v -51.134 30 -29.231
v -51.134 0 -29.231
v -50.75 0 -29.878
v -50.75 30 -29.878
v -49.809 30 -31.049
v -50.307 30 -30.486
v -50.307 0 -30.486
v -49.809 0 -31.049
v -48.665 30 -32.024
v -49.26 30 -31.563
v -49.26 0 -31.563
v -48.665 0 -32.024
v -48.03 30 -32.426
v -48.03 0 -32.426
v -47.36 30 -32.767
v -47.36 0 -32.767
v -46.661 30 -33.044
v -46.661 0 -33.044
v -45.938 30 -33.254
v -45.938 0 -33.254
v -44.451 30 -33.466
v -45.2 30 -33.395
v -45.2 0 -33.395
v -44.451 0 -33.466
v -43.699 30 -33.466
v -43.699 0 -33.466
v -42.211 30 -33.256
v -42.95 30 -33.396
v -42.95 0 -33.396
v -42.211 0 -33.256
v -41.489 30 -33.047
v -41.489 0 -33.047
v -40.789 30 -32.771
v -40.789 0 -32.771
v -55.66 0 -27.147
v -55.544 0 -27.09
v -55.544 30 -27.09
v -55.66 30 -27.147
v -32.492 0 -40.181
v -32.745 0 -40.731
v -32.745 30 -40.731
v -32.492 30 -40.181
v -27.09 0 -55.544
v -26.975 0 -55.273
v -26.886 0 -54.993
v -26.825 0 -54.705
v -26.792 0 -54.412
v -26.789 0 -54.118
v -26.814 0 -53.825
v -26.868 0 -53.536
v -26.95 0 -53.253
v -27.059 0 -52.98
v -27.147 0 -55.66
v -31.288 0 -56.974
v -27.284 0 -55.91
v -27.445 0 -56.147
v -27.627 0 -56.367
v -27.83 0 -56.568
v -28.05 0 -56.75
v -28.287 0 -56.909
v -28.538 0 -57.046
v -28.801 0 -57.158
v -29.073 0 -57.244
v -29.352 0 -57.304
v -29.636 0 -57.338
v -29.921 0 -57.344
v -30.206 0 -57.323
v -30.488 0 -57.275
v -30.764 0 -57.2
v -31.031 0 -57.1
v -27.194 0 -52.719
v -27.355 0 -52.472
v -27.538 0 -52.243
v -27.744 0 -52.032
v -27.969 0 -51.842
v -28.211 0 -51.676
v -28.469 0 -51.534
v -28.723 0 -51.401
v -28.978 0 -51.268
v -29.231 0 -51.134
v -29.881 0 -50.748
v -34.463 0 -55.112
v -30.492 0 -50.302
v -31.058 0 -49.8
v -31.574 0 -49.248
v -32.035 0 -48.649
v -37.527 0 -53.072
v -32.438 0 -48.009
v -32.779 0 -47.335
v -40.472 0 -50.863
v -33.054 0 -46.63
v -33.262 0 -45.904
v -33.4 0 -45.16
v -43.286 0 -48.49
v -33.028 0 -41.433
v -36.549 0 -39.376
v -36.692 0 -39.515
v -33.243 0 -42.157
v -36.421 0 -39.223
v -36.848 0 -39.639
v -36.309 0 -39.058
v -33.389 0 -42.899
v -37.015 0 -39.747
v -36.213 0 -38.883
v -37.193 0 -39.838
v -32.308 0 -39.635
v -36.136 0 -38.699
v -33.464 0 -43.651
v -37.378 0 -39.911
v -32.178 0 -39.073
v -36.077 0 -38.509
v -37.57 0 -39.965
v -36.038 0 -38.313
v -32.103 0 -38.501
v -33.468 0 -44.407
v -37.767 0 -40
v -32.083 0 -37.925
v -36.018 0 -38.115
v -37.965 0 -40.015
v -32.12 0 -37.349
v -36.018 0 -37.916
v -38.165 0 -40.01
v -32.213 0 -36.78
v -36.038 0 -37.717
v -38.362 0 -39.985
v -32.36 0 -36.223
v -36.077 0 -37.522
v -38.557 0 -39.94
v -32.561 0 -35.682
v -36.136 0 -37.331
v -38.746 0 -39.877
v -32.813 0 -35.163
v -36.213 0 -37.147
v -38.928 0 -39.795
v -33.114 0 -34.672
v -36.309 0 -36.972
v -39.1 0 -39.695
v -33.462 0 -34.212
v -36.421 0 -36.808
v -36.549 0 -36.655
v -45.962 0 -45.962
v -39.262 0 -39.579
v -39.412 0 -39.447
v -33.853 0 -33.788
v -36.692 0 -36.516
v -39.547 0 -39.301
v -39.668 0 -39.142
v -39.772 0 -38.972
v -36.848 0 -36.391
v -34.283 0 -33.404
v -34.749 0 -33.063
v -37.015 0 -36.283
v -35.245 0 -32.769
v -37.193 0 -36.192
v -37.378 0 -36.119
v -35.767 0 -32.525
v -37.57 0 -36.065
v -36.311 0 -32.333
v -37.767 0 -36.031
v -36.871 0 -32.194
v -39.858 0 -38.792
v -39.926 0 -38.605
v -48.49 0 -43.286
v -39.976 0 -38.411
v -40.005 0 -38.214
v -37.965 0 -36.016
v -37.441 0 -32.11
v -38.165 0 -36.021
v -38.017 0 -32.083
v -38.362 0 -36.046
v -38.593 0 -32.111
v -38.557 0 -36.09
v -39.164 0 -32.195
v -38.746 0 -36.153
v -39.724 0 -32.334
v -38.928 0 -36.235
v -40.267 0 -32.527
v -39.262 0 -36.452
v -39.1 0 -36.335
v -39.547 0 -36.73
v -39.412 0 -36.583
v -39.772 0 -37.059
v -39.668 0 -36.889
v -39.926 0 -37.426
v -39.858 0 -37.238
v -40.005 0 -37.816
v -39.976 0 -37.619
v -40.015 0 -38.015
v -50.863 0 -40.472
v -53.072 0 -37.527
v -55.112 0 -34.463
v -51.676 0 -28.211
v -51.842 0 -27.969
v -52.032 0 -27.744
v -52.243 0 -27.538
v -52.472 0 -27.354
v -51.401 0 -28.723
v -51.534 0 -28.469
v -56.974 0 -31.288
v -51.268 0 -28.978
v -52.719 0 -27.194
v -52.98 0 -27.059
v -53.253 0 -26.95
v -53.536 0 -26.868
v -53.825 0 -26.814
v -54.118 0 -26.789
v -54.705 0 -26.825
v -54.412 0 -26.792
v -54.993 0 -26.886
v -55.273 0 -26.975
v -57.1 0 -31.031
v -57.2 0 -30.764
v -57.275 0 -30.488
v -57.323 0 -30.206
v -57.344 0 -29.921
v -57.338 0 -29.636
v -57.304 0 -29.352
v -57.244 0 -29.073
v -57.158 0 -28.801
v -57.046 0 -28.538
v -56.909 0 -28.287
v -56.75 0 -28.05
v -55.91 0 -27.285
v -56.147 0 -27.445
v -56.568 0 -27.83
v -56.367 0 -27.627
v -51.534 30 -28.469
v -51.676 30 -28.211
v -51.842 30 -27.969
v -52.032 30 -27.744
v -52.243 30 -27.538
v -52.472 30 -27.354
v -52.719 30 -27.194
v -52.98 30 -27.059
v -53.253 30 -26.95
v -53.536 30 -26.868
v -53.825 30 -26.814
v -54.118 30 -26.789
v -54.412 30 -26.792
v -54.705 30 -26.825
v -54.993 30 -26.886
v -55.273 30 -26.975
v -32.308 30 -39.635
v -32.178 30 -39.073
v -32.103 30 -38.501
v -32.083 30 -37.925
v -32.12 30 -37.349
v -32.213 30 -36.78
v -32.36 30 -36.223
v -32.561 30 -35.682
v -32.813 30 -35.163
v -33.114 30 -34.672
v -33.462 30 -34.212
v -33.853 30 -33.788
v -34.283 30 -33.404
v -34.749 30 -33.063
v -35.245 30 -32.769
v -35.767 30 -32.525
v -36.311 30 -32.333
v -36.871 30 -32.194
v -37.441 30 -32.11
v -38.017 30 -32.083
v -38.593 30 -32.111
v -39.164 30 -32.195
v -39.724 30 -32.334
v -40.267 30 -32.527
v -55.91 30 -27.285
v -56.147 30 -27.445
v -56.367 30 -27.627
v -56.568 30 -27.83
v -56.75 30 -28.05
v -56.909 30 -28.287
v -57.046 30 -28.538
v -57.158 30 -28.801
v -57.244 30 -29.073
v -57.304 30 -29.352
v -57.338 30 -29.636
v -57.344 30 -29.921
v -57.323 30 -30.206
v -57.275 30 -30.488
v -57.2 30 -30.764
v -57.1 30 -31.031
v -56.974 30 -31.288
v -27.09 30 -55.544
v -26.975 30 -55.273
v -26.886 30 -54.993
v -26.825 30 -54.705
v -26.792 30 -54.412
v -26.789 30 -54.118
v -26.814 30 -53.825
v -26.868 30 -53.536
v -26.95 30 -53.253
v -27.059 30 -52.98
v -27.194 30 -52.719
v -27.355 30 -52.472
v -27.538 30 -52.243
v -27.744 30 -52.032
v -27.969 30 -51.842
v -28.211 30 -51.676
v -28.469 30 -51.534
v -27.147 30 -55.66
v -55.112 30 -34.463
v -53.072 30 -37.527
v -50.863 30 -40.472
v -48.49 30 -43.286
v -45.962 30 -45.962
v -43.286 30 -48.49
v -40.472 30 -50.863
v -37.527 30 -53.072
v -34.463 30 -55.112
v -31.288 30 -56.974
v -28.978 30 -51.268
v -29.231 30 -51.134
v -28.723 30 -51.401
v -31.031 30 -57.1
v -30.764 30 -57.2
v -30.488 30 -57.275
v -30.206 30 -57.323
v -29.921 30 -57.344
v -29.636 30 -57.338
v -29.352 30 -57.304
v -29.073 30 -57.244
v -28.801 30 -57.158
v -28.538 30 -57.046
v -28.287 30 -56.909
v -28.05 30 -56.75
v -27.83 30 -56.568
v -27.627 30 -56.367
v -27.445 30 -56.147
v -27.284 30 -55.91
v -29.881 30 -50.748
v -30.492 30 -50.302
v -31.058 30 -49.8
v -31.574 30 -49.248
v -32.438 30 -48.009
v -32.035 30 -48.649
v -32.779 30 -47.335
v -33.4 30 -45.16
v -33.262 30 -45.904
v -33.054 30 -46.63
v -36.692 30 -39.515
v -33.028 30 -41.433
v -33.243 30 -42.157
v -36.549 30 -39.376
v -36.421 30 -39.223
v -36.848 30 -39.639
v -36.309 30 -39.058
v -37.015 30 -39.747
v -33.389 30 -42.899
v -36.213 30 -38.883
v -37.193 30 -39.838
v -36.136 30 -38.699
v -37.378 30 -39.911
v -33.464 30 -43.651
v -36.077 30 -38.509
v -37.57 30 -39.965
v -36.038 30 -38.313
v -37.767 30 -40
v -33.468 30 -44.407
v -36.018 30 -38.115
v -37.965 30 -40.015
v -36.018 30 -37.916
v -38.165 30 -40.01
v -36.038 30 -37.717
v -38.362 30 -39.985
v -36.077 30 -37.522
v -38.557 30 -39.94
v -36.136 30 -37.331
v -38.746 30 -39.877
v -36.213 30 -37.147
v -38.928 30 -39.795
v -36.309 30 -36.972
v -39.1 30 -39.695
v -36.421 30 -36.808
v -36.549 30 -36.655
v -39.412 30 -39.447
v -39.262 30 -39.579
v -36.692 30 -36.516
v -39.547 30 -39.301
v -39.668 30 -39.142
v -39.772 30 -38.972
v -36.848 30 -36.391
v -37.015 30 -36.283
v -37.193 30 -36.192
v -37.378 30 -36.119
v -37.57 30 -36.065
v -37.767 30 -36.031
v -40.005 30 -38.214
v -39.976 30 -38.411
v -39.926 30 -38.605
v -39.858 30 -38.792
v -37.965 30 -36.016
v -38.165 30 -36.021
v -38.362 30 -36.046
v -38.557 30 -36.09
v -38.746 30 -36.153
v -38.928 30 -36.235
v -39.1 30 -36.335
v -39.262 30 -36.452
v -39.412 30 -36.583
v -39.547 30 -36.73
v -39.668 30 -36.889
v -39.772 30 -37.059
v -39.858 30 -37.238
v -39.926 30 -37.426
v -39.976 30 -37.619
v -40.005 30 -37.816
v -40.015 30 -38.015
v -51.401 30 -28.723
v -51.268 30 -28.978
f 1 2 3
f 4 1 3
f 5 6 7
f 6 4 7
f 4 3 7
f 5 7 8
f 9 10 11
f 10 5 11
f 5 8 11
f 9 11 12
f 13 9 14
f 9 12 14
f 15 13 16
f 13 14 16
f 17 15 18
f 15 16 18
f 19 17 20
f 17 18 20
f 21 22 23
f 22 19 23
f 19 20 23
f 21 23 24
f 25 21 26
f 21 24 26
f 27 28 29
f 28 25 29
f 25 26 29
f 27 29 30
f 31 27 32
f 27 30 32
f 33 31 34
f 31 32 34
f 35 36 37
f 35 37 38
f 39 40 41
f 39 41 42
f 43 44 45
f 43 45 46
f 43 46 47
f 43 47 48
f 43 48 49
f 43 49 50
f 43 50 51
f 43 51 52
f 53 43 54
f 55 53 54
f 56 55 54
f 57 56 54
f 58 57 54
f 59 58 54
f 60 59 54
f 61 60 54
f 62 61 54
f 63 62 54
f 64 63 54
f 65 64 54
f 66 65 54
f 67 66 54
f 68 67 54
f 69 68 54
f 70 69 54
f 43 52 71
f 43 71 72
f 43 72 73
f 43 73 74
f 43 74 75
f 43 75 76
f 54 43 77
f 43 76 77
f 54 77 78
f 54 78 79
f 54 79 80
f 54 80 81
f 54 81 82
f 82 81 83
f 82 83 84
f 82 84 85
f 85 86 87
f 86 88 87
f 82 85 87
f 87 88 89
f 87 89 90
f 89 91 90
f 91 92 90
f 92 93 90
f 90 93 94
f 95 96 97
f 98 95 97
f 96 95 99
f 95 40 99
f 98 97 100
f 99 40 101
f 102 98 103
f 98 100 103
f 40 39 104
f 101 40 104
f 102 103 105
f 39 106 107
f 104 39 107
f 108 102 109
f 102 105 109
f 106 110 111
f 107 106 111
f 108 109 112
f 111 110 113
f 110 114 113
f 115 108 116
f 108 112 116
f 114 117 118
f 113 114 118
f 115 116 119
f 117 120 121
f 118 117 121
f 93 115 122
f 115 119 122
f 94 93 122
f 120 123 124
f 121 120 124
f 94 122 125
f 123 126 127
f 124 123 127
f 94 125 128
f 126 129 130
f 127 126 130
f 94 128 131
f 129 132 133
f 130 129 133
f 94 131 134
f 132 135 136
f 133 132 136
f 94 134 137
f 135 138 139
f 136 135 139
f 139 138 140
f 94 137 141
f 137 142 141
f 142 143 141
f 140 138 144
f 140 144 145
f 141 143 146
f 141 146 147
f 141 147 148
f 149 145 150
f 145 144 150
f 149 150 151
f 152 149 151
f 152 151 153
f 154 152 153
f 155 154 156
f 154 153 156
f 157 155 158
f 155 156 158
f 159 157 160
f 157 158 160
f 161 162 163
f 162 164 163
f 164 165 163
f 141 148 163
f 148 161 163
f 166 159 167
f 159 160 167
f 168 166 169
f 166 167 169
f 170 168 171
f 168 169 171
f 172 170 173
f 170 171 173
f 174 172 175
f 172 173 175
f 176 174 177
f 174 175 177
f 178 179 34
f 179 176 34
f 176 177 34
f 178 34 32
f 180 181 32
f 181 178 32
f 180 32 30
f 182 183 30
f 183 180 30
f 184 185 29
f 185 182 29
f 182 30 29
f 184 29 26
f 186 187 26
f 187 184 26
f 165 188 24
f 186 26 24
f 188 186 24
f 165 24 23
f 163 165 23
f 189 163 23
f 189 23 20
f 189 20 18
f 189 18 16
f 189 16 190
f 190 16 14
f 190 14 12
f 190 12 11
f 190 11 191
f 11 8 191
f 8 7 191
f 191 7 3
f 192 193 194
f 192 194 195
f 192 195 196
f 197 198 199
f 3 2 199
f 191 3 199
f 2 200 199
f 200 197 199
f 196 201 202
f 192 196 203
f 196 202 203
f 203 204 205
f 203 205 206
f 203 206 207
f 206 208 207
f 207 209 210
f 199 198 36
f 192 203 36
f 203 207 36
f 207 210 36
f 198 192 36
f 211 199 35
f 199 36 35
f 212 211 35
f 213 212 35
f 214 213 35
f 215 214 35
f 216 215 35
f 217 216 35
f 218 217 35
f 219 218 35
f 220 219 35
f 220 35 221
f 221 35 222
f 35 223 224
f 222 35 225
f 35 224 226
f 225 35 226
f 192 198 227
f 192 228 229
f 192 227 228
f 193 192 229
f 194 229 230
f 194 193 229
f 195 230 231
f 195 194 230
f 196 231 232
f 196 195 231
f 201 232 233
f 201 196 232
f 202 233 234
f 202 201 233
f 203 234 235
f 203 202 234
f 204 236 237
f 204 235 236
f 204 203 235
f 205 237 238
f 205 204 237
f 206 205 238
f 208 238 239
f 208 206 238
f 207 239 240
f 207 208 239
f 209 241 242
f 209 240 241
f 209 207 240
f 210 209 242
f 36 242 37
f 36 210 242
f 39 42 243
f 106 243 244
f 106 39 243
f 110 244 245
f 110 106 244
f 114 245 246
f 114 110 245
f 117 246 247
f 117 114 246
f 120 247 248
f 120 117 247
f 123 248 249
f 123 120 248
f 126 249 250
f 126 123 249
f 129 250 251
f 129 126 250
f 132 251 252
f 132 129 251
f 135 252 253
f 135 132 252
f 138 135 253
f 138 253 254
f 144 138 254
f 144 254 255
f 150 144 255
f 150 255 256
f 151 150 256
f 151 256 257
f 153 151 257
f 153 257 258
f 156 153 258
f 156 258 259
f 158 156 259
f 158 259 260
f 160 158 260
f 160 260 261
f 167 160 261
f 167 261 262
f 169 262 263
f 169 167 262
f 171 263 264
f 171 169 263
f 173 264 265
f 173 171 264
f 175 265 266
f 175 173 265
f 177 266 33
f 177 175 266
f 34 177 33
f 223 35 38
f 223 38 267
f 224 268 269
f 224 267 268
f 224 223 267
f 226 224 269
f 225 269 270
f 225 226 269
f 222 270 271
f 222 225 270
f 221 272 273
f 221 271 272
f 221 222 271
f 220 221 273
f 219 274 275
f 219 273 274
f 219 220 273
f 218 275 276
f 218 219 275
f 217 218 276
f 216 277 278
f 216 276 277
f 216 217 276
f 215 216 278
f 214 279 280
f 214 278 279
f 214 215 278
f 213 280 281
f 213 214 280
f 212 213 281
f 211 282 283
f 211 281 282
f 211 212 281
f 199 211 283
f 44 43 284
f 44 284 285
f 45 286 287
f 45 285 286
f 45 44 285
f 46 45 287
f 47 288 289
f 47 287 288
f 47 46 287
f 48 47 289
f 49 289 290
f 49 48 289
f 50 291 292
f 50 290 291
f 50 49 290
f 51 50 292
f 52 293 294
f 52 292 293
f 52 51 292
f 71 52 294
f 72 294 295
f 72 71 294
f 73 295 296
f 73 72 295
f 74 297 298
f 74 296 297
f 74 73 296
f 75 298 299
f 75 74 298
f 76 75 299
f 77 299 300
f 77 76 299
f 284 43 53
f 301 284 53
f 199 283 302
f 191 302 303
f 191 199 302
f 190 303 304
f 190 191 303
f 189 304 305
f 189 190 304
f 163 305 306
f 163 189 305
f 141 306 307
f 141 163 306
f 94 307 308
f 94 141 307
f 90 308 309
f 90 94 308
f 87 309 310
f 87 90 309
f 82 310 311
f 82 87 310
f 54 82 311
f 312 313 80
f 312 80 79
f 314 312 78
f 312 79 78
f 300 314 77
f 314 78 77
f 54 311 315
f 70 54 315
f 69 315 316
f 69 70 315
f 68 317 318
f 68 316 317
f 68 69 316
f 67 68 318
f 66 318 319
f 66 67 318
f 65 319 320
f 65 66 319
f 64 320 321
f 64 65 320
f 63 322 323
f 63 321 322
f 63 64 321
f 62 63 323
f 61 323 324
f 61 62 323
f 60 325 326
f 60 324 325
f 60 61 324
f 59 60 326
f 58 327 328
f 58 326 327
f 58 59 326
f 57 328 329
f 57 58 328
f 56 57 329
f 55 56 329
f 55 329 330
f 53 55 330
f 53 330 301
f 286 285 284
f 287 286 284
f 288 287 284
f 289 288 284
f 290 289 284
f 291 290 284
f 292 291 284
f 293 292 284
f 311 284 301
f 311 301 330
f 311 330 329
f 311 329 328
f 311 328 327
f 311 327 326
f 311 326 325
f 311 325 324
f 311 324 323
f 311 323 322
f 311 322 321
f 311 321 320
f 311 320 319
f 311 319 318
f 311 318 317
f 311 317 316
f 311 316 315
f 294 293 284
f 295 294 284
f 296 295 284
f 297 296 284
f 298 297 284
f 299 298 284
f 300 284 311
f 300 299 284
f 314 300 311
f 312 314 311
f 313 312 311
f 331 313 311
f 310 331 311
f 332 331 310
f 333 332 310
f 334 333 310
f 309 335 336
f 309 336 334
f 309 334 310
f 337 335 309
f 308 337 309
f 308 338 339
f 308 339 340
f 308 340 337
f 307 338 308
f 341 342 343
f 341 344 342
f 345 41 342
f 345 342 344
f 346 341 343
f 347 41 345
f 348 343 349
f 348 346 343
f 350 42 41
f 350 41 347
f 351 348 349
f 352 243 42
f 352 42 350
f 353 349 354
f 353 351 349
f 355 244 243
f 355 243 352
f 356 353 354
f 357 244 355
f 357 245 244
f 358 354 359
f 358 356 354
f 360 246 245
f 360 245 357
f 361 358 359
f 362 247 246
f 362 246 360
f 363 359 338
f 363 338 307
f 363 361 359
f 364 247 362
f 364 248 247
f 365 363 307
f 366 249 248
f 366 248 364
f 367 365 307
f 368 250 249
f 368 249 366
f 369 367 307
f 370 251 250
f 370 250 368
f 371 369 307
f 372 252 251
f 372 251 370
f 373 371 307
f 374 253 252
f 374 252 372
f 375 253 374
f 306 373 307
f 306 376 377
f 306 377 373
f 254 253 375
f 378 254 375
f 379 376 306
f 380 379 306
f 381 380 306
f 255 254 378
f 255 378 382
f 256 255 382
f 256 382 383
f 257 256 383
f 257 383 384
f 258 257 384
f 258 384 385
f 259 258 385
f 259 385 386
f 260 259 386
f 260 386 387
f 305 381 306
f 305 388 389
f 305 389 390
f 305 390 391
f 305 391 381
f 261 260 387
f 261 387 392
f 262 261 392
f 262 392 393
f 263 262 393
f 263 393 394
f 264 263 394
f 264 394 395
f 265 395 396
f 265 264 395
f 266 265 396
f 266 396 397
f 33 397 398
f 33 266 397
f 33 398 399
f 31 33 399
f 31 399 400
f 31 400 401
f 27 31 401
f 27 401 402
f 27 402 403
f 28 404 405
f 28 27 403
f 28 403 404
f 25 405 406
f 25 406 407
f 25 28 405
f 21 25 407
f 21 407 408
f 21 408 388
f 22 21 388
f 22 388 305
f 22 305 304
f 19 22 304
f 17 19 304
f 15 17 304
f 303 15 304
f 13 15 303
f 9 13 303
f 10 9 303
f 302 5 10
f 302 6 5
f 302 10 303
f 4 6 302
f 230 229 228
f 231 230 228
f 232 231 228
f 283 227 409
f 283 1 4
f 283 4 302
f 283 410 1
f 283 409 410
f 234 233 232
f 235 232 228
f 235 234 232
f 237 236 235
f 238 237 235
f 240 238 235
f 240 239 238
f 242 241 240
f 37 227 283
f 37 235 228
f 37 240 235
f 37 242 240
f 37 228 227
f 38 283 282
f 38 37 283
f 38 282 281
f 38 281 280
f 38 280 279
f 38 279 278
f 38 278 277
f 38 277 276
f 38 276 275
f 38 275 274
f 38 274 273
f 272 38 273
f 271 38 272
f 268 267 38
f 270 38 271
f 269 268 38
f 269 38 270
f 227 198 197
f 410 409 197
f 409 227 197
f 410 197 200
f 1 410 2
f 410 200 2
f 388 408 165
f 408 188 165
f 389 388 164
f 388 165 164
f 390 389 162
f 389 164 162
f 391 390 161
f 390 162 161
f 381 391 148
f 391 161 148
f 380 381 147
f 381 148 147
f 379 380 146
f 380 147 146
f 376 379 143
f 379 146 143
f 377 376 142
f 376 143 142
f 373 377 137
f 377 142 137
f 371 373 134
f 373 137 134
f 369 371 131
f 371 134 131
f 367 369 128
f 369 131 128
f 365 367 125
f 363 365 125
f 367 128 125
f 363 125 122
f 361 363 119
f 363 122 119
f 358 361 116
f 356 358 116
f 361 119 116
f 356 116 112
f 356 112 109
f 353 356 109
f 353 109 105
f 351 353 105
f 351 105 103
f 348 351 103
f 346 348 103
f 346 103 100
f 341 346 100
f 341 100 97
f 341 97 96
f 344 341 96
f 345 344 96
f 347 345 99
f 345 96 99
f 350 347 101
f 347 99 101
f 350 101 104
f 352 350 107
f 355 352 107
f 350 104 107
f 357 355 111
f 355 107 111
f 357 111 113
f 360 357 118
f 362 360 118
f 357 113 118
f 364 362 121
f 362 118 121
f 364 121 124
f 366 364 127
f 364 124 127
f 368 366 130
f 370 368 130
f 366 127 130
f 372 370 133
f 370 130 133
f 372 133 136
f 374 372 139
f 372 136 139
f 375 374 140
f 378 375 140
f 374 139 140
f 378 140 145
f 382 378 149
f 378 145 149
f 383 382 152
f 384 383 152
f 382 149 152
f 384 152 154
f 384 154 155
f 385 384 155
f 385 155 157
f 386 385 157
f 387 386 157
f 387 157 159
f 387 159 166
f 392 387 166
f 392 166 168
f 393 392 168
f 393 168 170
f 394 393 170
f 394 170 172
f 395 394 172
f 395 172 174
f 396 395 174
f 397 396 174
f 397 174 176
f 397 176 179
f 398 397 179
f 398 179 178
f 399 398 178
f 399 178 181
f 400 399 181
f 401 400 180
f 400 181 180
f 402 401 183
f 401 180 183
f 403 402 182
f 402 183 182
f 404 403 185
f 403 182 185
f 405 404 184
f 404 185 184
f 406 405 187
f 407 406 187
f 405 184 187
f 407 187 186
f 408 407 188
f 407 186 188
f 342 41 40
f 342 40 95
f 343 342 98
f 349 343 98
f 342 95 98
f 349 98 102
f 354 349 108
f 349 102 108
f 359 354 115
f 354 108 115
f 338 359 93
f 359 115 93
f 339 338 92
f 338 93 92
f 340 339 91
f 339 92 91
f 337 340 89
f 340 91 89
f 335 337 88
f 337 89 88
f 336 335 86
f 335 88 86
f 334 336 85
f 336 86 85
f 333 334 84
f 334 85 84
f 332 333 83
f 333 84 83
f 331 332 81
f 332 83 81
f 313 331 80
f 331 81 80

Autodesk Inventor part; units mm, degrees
ref_plane "XZ Plane" through (0, 0, 0) normal (0, 1, 0) x (-1, 0, 0)
ref_plane "XY Plane" through (0, 0, 0) normal (0, 0, 1) x (1, 0, 0)
sketch "Sketch1" plane through (0, 0, 0) normal (0, 1, 0) x (-1, 0, 0)
  arc A0 (31.2876, -56.9744) -> (58.4216, -28.4941) centre (0, 0) ccw
  line L0 (0, -76.4247) -> (0, 75.7077)
  line L1 (75.2776, 0) -> (-75.7077, 0)
  line L2 (0, 0) -> (78.1118, -78.1118)
  line L3 (0, 0) -> (84.1598, -41.0475)
  line L4 (0, 0) -> (41.0475, -84.1598)
  circle A1 centre (38.0152, -38.0152) radius 2
  arc A2 (40.7893, -32.7712) -> (32.7712, -40.7893) centre (38.0152, -38.0152) ccw
  line L5 (27.1472, -55.66) -> (27.0904, -55.5436)
  arc A3 (27.1472, -55.66) -> (31.2876, -56.9744) centre (29.8436, -54.3448) ccw
  arc A4 (28.4686, -51.5336) -> (27.0904, -55.5436) centre (29.7868, -54.2284) ccw
  arc A5 (28.4686, -51.5336) -> (29.2312, -51.1337) centre (-5.4867, 14.1516) ccw
  line L6 (32.7449, -40.7314) -> (32.4923, -40.1813)
  arc A6 (29.2312, -51.1337) -> (32.7449, -40.7314) centre (25.475, -44.0703) ccw
  line L7 (55.66, -27.1472) -> (55.5436, -27.0904)
  arc A7 (56.9744, -31.2876) -> (55.66, -27.1472) centre (54.3448, -29.8436) ccw
  arc A8 (55.5436, -27.0904) -> (51.5336, -28.4686) centre (54.2284, -29.7868) ccw
  arc A9 (51.1337, -29.2312) -> (51.5336, -28.4686) centre (-14.1516, 5.4867) ccw
  arc A10 (40.7314, -32.7449) -> (51.1337, -29.2312) centre (44.0703, -25.475) ccw
  point P0 (28.4941, -58.4216)
  point P1 (25.6079, -52.5039)
  point P2 (35.7325, -47.2364)
  point P3 (55.5436, -27.0904)
  dimension "d0" = 65
  dimension "d1" = 45
  dimension "d2" = 26
  dimension "d3" = 4
  dimension "d4" = 3
  dimension "d6" = 8
extrude "Extrusion1" add sketch "Sketch1" along normal blind 30 contours A0 L2 A1 A2 A10 A9 A8 L3 A7 | A0 A3 L4 A4 A5 A6 L6 A2 L2 A1
ref_plane "Work Plane1" through (0, 0, 0) normal (0.7071, 0, -0.7071) x (0, 1, 0)
properties part number "Foam Attachment"
